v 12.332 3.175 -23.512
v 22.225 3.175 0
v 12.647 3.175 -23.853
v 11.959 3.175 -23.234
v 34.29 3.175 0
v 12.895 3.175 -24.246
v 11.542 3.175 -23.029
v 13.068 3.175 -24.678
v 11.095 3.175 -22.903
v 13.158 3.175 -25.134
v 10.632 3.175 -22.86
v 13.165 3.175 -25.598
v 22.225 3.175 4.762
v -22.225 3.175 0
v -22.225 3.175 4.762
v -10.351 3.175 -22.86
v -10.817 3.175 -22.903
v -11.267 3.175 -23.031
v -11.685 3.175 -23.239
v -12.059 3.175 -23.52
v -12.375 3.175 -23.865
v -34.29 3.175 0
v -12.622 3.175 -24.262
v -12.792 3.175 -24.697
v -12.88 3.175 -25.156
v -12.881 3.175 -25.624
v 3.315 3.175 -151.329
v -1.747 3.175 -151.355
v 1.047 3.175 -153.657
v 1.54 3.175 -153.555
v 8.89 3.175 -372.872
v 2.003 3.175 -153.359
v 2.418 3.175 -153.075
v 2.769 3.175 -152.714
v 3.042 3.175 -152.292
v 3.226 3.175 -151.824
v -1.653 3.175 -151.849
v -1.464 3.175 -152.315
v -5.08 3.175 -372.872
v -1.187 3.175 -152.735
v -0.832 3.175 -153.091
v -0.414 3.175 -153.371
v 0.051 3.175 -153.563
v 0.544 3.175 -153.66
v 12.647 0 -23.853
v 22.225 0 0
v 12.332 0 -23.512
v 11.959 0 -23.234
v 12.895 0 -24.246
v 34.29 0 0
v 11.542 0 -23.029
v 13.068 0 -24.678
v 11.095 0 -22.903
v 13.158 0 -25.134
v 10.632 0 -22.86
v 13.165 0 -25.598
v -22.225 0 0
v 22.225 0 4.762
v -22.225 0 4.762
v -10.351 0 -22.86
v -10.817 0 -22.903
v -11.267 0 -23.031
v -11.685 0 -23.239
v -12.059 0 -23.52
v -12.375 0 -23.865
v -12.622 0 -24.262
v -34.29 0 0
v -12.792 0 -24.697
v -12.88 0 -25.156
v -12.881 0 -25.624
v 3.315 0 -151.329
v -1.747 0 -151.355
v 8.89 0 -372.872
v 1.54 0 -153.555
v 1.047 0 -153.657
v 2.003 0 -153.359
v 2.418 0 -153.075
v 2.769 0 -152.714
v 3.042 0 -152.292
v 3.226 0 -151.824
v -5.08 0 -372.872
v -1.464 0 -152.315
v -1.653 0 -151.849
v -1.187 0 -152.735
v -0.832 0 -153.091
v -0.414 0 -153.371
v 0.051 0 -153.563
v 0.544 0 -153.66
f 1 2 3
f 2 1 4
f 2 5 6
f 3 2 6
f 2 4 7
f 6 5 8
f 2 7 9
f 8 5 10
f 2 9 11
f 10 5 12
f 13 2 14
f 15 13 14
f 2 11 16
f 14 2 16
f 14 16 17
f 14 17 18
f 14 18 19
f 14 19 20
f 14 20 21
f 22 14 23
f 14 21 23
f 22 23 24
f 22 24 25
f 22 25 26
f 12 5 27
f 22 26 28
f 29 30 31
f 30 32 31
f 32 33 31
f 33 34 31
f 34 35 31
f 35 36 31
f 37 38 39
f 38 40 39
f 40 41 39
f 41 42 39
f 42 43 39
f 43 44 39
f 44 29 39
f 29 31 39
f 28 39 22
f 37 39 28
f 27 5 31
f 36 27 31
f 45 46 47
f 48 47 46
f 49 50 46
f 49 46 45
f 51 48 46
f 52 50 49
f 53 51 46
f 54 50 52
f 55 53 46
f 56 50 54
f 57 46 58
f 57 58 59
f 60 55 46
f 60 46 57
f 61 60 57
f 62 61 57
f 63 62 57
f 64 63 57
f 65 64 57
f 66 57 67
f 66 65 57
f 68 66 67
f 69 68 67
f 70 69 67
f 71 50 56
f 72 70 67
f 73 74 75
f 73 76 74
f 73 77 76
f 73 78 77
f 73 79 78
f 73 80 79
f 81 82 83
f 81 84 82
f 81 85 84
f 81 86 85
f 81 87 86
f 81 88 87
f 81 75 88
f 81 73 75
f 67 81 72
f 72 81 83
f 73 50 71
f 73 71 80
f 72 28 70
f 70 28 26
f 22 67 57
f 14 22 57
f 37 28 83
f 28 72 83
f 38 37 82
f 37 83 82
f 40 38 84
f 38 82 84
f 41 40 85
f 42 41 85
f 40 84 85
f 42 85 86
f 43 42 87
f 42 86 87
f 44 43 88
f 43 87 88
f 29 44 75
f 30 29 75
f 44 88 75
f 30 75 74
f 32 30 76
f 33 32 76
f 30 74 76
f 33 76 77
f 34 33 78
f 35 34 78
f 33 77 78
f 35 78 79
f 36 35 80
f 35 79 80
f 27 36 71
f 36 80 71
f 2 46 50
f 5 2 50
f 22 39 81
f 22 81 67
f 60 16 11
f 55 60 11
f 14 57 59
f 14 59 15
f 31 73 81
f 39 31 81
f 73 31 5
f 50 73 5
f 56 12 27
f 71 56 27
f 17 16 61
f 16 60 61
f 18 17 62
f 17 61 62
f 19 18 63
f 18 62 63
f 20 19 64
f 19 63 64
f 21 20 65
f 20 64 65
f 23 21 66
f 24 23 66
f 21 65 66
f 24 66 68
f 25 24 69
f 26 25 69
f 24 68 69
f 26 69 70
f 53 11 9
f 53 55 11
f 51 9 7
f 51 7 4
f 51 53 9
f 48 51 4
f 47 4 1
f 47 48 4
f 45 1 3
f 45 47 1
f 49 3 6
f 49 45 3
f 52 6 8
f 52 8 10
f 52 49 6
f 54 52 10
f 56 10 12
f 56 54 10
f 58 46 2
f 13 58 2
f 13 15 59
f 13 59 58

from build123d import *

# Parameters (mm, degrees)
BOSS_EXTRUDE1_DEPTH = 3.175
CUT_EXTRUDE1_DEPTH  = 3.175
FILLET1_R           = 2.54
SKETCH3_W           = 44.45
SKETCH3_H           = 3.175
BOSS_EXTRUDE2_DEPTH = 4.7625
CUT_EXTRUDE2_DEPTH  = 375.826918736


with BuildPart() as part:
    # Sketch1 → Boss-Extrude1 (new body)
    with BuildSketch(Plane(origin=(0, 0, 0), x_dir=(1, 0, 0), z_dir=(0, 1, 0))):
        Polygon((0, 0), (-38.1, 0), (-5.08, 372.872), (0, 372.872), (8.89, 372.872), (38.1, 0), align=None)
    extrude(amount=BOSS_EXTRUDE1_DEPTH)

    # Sketch2 → Cut-Extrude1 (cut)
    with BuildSketch(Plane(origin=(0, 3.175, 0), x_dir=(1, 0, 0), z_dir=(0, 1, 0))):
        Polygon((13.379159589, 22.86), (0.937890665, 181.675502439), (-13.126152466, 22.86), align=None)
    extrude(amount=-CUT_EXTRUDE1_DEPTH, mode=Mode.SUBTRACT)

    # Fillet1
    fillet1_edges = [part.edges().sort_by_distance(p)[0] for p in [
        (-13.126152466, 1.5875, -22.86),
        (0.937890665, 1.5875, -181.675502439),
        (13.379159589, 1.5875, -22.86),
    ]]
    fillet(fillet1_edges, radius=FILLET1_R)

    # Sketch3 → Boss-Extrude2 (add)
    with BuildSketch(Plane.XY):
        with Locations((0, 1.5875)):
            Rectangle(SKETCH3_W, SKETCH3_H)
    extrude(amount=BOSS_EXTRUDE2_DEPTH)

    # Sketch4 → Cut-Extrude2 (cut, through all)
    with BuildSketch(Plane(origin=(0, 3.175, 0), x_dir=(1, 0, 0), z_dir=(0, 1, 0))):
        Polygon((-5.08, 372.872), (-34.29, 0), (-38.1, 0), align=None)
        Polygon((38.1, 0), (8.89, 372.872), (34.29, 0), align=None)
    extrude(amount=-CUT_EXTRUDE2_DEPTH, mode=Mode.SUBTRACT)


solid = part.part
